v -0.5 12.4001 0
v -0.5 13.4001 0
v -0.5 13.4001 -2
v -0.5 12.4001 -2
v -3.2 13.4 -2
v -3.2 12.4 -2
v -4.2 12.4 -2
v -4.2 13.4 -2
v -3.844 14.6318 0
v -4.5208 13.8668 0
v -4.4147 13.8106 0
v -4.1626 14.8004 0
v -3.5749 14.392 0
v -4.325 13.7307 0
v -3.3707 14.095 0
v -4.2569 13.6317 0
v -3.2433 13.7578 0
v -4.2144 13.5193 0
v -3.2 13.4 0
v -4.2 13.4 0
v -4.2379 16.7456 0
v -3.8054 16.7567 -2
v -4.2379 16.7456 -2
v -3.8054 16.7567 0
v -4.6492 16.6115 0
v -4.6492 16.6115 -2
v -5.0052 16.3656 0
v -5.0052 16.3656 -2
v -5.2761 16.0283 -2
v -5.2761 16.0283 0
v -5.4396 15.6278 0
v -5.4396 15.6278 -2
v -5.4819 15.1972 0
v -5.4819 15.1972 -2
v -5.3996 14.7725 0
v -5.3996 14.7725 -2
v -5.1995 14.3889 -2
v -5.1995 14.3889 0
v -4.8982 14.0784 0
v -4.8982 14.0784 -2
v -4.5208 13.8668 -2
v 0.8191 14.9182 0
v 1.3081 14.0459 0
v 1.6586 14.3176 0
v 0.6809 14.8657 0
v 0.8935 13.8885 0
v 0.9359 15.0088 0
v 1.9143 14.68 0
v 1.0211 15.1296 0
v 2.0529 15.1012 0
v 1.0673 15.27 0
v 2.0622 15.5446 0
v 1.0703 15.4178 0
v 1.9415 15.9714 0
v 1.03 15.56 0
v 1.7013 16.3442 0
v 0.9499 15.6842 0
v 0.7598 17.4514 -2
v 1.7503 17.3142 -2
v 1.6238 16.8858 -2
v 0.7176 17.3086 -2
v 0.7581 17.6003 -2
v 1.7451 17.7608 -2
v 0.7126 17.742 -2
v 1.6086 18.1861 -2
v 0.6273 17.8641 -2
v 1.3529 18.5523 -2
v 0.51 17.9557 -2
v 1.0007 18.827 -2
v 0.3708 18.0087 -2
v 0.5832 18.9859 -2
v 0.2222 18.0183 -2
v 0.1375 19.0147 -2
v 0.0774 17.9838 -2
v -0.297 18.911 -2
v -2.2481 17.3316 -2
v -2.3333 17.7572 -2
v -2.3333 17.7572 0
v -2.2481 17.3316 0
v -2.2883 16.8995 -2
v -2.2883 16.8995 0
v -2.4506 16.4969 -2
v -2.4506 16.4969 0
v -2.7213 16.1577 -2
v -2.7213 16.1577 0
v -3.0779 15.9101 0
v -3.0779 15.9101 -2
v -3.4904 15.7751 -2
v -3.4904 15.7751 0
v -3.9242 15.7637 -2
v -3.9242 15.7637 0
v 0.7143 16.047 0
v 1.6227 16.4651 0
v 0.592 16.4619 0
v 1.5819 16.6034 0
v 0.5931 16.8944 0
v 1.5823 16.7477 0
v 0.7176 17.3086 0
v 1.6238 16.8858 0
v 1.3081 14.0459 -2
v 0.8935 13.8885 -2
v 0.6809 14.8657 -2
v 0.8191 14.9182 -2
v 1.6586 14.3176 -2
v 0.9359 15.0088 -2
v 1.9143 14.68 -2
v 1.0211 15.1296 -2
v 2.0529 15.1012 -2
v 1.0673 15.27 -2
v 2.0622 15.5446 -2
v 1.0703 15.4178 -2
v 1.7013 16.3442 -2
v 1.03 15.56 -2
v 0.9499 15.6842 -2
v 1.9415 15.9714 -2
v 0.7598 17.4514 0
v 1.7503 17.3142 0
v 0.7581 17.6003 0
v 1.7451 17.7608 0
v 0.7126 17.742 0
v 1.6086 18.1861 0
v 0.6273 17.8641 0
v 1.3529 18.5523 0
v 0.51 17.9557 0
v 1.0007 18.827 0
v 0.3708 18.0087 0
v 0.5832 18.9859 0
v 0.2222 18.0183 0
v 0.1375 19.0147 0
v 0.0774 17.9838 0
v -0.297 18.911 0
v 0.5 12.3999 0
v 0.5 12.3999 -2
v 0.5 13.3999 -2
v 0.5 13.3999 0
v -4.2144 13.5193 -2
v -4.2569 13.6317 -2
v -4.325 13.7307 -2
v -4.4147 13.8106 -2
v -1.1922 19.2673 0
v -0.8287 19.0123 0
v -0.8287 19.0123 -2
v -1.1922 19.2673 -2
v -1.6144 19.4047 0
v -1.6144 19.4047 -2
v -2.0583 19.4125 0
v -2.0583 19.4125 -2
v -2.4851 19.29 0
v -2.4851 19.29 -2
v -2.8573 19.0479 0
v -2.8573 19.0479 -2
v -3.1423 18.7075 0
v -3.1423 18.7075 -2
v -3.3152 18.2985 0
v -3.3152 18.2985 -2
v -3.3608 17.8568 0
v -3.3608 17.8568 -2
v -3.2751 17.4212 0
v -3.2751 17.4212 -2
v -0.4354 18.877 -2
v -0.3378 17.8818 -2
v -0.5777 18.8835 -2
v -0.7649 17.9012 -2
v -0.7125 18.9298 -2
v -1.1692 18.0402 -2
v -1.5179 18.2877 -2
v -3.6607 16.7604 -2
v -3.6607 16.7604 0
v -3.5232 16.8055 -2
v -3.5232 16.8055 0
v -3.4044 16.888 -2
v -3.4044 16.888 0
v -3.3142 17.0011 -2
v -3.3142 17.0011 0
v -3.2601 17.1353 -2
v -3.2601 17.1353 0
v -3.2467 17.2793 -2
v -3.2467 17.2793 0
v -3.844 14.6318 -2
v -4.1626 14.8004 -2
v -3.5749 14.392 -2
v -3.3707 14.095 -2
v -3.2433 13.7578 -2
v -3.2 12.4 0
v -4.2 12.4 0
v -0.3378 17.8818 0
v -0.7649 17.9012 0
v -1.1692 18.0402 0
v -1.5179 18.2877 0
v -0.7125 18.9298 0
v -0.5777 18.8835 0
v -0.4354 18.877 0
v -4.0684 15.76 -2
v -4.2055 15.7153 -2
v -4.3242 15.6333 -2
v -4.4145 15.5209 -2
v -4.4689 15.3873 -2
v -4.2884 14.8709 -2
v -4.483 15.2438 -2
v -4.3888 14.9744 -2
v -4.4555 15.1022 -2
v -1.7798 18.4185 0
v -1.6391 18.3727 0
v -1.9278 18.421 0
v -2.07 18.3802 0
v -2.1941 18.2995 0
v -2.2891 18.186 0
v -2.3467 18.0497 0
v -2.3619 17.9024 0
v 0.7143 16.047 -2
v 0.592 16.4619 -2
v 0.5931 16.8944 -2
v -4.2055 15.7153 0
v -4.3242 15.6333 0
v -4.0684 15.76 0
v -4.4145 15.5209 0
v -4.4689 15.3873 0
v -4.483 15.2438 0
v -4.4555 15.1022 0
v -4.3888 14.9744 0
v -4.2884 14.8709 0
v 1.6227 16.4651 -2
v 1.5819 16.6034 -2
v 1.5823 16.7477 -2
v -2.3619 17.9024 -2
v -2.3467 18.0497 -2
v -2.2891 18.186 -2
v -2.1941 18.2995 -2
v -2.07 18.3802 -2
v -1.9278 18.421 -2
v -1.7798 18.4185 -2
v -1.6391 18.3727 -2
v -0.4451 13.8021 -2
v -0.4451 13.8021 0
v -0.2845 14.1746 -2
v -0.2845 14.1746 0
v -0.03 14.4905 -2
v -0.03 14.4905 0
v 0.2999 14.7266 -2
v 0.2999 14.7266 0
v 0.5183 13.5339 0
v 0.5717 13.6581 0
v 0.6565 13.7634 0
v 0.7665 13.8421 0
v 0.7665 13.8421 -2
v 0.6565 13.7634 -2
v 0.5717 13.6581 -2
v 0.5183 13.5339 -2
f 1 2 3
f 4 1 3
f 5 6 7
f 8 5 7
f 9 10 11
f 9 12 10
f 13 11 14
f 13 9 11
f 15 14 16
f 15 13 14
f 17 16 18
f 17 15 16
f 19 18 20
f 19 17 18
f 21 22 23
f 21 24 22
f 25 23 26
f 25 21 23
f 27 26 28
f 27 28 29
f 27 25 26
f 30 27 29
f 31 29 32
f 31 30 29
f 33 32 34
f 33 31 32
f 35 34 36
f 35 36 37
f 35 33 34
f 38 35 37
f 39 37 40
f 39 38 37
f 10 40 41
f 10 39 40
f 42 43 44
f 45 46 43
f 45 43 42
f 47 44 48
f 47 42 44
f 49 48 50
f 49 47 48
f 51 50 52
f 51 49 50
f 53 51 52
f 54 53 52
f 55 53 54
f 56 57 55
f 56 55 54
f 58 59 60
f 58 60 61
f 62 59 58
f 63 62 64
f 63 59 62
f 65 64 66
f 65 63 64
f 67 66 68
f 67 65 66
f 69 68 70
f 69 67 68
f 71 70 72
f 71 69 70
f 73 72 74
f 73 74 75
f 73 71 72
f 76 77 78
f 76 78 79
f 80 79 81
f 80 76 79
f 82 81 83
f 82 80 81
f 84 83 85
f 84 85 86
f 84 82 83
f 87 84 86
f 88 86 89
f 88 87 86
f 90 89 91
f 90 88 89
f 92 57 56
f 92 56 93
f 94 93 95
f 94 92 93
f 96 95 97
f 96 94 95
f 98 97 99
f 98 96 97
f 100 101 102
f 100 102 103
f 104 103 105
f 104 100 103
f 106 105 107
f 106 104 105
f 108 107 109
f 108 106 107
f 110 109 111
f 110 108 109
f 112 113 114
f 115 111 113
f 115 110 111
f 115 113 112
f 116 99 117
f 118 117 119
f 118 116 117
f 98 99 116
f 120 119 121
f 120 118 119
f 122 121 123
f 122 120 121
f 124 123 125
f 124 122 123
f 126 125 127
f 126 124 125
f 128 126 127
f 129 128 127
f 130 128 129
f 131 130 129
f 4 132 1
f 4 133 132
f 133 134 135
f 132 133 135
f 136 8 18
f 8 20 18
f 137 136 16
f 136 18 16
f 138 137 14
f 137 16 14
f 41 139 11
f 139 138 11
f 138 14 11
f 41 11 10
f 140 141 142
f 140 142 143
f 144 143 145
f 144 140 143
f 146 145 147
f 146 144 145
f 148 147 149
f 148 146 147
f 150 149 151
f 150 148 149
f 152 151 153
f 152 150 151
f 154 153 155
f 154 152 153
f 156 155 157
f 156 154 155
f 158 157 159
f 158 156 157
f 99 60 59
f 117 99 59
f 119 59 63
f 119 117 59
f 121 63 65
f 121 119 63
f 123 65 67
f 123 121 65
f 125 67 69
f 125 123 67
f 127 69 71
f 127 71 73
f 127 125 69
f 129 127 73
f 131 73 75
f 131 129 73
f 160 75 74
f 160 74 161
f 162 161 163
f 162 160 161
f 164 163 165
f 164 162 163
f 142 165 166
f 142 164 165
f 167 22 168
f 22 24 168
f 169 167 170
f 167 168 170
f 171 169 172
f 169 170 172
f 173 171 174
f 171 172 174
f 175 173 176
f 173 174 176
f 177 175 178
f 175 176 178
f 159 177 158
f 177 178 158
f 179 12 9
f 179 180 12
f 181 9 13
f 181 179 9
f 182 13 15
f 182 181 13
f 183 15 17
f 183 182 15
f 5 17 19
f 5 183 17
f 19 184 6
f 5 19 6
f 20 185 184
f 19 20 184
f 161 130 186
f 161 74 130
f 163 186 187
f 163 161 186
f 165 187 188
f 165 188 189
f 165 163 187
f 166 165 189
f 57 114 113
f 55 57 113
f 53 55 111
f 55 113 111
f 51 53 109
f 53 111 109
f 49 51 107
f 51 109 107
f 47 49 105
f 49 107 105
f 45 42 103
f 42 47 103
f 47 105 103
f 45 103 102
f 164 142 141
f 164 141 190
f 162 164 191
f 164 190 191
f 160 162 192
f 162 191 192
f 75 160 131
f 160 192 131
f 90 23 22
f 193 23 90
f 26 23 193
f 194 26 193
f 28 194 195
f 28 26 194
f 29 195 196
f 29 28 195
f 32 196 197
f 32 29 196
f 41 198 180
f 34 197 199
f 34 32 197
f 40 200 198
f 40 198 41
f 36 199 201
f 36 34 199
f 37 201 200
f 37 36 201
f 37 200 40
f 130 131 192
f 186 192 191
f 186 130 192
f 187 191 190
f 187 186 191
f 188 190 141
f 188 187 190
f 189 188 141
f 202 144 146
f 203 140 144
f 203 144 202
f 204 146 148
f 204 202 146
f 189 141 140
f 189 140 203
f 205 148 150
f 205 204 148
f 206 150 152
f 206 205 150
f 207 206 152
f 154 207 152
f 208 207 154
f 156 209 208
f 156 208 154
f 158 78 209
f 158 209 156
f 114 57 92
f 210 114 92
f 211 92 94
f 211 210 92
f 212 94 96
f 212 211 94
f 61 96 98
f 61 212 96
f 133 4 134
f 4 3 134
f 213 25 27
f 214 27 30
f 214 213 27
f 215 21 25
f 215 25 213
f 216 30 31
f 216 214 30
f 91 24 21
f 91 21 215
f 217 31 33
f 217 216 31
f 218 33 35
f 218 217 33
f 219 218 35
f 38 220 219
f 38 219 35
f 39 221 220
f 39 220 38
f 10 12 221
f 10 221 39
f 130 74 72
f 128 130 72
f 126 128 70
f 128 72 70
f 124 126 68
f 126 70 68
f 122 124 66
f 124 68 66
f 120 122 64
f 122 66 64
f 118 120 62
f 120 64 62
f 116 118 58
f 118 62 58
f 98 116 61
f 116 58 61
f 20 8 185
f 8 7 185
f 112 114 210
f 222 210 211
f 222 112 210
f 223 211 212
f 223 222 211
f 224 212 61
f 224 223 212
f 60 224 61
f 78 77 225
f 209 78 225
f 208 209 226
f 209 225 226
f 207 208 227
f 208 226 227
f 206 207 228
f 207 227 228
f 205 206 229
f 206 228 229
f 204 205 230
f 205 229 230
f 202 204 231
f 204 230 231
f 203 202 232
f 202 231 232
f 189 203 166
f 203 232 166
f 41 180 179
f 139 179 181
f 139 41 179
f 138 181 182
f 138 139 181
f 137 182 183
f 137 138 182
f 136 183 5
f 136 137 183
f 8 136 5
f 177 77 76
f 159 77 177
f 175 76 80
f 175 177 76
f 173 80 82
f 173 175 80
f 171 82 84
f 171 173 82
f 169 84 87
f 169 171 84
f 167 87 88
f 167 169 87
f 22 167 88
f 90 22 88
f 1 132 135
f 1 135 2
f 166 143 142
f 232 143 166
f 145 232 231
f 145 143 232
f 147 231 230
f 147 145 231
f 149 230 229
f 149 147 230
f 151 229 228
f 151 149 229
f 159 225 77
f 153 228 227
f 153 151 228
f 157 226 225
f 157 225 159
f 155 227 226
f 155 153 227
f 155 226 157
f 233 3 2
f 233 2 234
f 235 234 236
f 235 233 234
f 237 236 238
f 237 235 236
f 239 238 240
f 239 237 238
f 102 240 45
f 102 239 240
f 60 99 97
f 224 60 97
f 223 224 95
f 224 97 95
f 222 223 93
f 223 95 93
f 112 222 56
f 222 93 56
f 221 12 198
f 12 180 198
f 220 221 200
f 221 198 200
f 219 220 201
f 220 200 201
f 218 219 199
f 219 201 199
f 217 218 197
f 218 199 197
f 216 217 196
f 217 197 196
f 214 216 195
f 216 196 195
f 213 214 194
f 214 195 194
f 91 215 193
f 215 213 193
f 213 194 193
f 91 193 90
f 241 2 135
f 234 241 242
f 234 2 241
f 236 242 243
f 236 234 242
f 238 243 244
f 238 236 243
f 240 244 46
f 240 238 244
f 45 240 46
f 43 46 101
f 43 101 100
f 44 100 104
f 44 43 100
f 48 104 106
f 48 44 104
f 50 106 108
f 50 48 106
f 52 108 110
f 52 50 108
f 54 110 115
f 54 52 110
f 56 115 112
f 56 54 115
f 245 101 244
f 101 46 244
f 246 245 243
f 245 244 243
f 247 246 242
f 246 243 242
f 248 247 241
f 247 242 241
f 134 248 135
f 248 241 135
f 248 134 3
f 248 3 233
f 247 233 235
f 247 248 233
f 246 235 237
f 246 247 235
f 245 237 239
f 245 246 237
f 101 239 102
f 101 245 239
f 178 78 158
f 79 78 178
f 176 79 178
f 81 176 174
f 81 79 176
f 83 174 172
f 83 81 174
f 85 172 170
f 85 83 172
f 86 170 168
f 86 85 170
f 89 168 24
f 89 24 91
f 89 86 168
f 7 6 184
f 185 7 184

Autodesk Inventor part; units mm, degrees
ref_plane "YZ Plane" through (0, 0, 0) normal (1, 0, 0) x (0, 1, 0)
ref_plane "XY Plane" through (0, 0, 0) normal (0, 0, 1) x (1, 0, 0)
sketch "Sketch1" plane through (0, 0, 0) normal (0, 0, 1) x (1, 0, 0)
  line L0 (0.85, 11.55) -> (0.85, -11.55) construction
  arc A0 (0.85, 11.55) -> (-0.85, 11.55) centre (0, 11.55) ccw construction
  line L1 (-0.85, -11.55) -> (-0.85, 11.55) construction
  arc A1 (-0.85, -11.55) -> (0.85, -11.55) centre (0, -11.55) ccw construction
  line L2 (-2.85, 11.55) -> (-2.85, -6.75) construction
  arc A2 (-2.85, 11.55) -> (-4.55, 11.55) centre (-3.7, 11.55) ccw construction
  line L3 (-4.55, -6.75) -> (-4.55, 11.55) construction
  arc A3 (-4.55, -6.75) -> (-2.85, -6.75) centre (-3.7, -6.75) ccw construction
  line L4 (0, 12.4) -> (0, 13.4)
  line L5 (-3.7, 12.4) -> (-3.7, 13.4)
  arc A4 (0.7872, 14.3771) -> (0, 13.4) centre (1, 13.4) ccw
  arc A5 (0.7872, 14.3771) -> (1.3256, 16.0142) centre (0.5744, 15.3542) ccw
  arc A6 (1.1707, 17.0972) -> (1.3256, 16.0142) centre (2.0769, 16.6743) ccw
  arc A7 (1.1707, 17.0972) -> (-0.1098, 18.4474) centre (0.2645, 17.5201) ccw
  arc A8 (-1.1733, 18.65) -> (-0.1098, 18.4474) centre (-0.4842, 19.3746) ccw
  arc A9 (-3.7, 13.4) -> (-4.3417, 14.3336) centre (-4.7, 13.4) ccw
  arc A10 (-3.8648, 16.2602) -> (-4.3417, 14.3336) centre (-3.9835, 15.2672) ccw
  arc A11 (-3.8648, 16.2602) -> (-2.8042, 17.5892) centre (-3.746, 17.2531) ccw
  arc A12 (-1.1733, 18.65) -> (-2.8042, 17.5892) centre (-1.8624, 17.9253) ccw
  point P0 (0, 0)
  dimension "d0" = 1
  dimension "d1" = 1
  dimension "d2" = 1
  dimension "d3" = 1
  dimension "d4" = 1
  dimension "d5" = 1
  dimension "d6" = 1
  dimension "d7" = 1
  dimension "d8" = 1
  dimension "d9" = 1
  dimension "d10" = 1
ref_plane "Work Plane1" through (-3.7, 12.4, 0) normal (0, 1, 0) x (-1, 0, 0)
sketch "Sketch2" plane through (-3.7, 12.4, 0) normal (0, 1, 0) x (-1, 0, 0)
  line L0 (-0.5, 0) -> (0.5, 0)
  line L1 (0.5, 0) -> (0.5, -2)
  line L2 (0.5, -2) -> (-0.5, -2)
  line L3 (-0.5, -2) -> (-0.5, 0)
  point P0 (-3.7, 0)
  point P1 (0, 0)
  dimension "d11" = 1
  dimension "d12" = 2
sweep "Sweep1" add profiles "Sketch2" path "Sketch1"
properties part number "string2"
